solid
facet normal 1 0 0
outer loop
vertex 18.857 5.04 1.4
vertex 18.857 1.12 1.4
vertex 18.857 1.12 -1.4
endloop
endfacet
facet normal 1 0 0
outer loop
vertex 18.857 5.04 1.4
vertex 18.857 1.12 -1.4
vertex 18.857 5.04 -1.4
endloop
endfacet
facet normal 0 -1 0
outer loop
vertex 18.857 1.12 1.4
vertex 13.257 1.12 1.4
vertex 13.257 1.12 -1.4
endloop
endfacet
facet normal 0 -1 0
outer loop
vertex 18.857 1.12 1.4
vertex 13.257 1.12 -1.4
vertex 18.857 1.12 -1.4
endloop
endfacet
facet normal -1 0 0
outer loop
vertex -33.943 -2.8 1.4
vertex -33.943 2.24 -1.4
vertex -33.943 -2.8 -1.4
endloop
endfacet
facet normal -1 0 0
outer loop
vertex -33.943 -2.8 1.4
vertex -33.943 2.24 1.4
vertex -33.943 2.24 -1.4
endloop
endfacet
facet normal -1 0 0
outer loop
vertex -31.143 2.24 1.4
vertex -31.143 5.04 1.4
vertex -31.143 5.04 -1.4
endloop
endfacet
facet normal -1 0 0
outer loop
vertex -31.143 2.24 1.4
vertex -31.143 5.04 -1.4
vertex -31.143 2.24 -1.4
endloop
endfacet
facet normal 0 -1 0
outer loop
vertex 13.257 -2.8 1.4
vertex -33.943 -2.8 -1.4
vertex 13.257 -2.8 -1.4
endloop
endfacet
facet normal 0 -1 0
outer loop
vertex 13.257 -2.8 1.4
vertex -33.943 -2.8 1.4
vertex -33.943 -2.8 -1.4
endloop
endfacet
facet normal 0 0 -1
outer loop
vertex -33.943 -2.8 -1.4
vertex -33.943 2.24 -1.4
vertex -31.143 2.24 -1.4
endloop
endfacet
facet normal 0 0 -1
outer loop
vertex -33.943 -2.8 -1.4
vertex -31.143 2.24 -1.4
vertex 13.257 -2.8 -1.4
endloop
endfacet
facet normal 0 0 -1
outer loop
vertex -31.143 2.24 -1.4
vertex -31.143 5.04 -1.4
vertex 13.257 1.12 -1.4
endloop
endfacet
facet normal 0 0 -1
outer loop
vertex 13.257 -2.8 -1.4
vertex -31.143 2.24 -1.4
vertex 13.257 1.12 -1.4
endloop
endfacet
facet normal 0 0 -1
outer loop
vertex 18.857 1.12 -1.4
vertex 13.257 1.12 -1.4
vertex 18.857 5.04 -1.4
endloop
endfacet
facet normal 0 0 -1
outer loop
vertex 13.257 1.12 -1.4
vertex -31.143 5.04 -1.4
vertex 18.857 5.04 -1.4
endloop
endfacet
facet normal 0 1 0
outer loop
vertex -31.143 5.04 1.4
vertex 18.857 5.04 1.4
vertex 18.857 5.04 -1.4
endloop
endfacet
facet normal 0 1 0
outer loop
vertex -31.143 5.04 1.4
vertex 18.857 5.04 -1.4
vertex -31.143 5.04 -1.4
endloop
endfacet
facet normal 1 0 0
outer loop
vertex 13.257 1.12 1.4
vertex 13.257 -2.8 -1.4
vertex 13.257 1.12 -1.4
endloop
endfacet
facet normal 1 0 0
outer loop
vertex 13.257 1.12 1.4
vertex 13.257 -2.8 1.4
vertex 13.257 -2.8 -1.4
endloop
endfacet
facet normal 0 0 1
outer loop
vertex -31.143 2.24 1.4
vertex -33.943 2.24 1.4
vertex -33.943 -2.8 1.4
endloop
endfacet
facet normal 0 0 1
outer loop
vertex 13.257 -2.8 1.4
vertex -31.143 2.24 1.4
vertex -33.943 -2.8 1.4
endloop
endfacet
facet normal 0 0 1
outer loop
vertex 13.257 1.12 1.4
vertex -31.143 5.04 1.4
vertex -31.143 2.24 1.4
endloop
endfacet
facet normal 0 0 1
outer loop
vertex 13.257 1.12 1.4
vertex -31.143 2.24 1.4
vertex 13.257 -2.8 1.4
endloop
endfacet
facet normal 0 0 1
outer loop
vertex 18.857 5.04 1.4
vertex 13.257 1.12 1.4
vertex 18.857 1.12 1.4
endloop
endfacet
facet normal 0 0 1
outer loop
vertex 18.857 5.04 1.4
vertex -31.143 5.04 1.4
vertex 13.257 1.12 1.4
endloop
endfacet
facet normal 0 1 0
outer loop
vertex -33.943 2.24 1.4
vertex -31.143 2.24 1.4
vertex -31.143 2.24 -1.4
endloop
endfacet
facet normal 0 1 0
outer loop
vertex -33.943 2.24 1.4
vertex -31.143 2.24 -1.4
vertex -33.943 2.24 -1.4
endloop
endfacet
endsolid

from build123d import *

# Parameters (mm, degrees)
EXTRUDE_1_DEPTH = 1.4


with BuildPart() as part:
    # Эскиз1 → Бобышка-Вытянуть1 (new, symmetric)
    with BuildSketch(Plane.XY):
        Polygon((-31.142857143, -2.8), (13.257142857, -2.8), (13.257142857, 1.12), (18.857142857, 1.12), (18.857142857, 5.04), (-31.142857143, 5.04), (-31.142857143, 2.24), (-33.942857143, 2.24), (-33.942857143, 0), (-33.942857143, -2.8), align=None)
    extrude(amount=EXTRUDE_1_DEPTH, both=True)


solid = part.part
